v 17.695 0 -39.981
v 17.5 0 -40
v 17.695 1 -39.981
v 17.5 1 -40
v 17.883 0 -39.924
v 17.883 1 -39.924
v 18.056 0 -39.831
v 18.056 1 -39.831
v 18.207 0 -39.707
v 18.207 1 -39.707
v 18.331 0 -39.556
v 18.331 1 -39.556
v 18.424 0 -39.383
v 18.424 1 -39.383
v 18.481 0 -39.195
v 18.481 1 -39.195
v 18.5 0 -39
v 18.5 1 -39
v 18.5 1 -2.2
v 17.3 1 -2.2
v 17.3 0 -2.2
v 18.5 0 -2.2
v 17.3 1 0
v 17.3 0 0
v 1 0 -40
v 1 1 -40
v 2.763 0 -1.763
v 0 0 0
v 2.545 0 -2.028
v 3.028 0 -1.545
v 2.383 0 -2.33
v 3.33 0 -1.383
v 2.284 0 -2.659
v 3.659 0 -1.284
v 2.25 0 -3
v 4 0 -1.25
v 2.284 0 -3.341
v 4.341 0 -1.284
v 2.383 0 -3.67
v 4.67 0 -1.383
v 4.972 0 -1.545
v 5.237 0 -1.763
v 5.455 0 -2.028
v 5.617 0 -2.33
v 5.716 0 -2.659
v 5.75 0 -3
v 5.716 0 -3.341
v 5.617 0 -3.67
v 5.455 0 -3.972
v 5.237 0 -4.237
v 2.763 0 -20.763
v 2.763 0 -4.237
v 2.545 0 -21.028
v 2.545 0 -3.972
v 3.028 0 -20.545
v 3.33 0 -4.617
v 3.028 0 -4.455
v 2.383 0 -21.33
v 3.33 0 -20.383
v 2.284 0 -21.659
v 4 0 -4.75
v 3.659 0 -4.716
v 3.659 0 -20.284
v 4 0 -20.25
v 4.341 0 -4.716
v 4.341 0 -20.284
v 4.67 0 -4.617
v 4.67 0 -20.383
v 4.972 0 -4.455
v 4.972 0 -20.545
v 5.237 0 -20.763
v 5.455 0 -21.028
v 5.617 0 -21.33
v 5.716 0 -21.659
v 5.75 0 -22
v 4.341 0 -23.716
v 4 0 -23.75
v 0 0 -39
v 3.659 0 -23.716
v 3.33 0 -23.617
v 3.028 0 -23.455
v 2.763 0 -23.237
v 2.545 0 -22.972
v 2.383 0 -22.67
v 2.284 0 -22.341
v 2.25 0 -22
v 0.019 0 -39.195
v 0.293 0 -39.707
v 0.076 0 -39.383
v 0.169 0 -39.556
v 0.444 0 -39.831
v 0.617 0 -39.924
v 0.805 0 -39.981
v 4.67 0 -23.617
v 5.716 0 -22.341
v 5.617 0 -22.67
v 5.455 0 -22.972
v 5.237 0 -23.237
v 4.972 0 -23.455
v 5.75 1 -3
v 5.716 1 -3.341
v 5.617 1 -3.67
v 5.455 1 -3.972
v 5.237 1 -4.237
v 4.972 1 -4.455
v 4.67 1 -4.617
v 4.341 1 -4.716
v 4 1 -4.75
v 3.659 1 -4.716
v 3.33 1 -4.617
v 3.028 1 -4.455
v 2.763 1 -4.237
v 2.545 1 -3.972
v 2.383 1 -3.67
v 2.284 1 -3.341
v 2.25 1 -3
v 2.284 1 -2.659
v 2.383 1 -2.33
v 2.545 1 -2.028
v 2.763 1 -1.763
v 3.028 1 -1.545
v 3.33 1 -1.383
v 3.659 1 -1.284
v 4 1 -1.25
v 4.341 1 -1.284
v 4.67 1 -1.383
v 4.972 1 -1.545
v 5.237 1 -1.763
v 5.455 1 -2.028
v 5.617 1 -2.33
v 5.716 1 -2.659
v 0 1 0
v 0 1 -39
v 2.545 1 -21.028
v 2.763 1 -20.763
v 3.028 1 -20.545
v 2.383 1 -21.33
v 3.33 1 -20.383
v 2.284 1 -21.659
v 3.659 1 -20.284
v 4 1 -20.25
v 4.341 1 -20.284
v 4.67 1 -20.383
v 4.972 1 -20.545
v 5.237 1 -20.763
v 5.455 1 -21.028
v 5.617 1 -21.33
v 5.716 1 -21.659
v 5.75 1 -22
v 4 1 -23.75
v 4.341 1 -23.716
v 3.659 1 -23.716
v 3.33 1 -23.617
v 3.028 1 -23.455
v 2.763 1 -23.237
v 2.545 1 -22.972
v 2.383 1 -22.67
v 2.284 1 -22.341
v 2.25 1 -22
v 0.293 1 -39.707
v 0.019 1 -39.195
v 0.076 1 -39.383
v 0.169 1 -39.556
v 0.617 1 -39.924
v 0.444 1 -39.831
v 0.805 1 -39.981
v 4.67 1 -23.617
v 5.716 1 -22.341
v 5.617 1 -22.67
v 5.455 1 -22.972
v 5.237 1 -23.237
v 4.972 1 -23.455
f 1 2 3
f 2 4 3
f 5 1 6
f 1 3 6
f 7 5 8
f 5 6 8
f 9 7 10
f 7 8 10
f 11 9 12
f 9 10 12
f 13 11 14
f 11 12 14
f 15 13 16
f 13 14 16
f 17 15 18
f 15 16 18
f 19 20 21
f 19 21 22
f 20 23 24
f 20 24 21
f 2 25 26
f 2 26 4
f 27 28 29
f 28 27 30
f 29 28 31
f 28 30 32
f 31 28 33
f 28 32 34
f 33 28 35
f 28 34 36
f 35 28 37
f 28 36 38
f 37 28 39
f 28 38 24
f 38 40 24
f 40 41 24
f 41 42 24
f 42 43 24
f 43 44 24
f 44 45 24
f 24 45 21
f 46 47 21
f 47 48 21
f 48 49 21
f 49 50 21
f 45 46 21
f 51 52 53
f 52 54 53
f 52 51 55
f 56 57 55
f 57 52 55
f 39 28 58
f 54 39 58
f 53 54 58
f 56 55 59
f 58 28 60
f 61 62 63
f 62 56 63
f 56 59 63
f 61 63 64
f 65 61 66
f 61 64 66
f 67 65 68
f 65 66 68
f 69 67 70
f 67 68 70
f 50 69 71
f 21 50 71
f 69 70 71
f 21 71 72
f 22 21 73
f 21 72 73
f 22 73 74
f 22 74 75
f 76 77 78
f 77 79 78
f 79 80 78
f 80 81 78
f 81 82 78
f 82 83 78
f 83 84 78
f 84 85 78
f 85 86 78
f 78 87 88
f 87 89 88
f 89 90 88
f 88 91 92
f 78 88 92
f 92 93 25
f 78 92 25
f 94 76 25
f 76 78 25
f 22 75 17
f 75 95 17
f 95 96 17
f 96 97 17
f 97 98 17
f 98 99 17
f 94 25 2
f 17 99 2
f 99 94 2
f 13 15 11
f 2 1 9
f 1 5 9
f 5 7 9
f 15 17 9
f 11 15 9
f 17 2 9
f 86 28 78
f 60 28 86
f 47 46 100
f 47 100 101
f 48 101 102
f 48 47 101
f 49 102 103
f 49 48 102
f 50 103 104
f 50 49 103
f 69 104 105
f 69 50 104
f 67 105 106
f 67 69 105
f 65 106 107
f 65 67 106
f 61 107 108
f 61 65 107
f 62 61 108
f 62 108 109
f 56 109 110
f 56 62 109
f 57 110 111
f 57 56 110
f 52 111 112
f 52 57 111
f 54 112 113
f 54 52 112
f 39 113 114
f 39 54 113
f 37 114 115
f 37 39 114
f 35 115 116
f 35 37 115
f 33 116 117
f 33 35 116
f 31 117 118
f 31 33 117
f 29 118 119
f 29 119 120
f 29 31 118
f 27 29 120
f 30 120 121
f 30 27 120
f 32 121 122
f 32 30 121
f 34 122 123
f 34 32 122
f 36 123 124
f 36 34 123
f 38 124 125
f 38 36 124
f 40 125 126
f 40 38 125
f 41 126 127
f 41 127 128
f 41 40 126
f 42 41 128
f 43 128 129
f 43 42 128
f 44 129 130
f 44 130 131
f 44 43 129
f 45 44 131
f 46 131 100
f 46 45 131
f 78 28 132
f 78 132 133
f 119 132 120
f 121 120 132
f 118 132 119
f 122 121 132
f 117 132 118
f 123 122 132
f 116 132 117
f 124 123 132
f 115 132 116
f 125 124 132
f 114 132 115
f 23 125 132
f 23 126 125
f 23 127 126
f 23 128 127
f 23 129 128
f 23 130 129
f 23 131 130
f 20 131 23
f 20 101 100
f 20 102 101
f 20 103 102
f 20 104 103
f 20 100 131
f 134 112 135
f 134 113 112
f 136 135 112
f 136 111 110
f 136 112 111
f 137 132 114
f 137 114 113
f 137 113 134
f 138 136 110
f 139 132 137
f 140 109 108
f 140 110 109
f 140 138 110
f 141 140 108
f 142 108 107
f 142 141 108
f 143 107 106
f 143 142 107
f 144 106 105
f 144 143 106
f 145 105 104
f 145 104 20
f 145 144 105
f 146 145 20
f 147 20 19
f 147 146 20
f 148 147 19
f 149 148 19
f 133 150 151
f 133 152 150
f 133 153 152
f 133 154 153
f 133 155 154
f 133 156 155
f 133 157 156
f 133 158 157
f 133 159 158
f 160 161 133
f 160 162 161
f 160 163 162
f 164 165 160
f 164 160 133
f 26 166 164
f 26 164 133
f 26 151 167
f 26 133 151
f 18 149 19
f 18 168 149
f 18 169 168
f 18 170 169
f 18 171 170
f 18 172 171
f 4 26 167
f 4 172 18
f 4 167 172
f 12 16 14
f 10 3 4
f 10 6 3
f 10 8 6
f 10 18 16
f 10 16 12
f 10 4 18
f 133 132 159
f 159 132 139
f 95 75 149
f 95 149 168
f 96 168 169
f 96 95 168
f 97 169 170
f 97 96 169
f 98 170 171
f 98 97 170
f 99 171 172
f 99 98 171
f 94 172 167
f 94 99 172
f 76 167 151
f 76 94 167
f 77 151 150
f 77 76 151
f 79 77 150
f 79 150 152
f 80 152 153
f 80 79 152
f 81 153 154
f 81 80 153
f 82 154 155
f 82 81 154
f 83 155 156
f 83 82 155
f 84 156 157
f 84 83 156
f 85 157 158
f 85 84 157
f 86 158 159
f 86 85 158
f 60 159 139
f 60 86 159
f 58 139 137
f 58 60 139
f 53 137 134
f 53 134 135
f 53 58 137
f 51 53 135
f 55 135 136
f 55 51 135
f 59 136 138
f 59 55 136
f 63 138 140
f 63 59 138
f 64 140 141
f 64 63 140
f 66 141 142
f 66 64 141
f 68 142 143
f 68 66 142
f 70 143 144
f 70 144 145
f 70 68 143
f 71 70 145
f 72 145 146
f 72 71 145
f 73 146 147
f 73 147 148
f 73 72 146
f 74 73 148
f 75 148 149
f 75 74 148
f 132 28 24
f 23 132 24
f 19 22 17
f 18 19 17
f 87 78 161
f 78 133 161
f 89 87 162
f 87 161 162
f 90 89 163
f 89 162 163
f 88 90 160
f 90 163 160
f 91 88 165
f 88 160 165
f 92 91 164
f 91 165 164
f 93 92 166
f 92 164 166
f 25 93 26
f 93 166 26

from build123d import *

# Parameters (mm, degrees)
CROQUIS1_W              = 18.5
CROQUIS1_H              = 40
CROQUIS1_R              = 1.75
SALIENTE_EXTRUIR1_DEPTH = 1
CROQUIS2_W              = 1.2
CROQUIS2_H              = 2.2
CORTAR_EXTRUIR1_DEPTH   = 1
REDONDEO1_R             = 1


with BuildPart() as part:
    # Croquis1 → Saliente-Extruir1 (new body)
    with BuildSketch(Plane(origin=(0, 0, 0), x_dir=(1, 0, 0), z_dir=(0, 1, 0))):
        with Locations((9.25, 20)):
            Rectangle(CROQUIS1_W, CROQUIS1_H)
        with Locations((4, 3)):
            Circle(CROQUIS1_R, mode=Mode.SUBTRACT)
        with Locations((4, 22)):
            Circle(CROQUIS1_R, mode=Mode.SUBTRACT)
    extrude(amount=SALIENTE_EXTRUIR1_DEPTH)

    # Croquis2 → Cortar-Extruir1 (cut)
    with BuildSketch(Plane(origin=(0, 1, 0), x_dir=(1, 0, 0), z_dir=(0, 1, 0))):
        with Locations((17.9, 1.1)):
            Rectangle(CROQUIS2_W, CROQUIS2_H)
    extrude(amount=-CORTAR_EXTRUIR1_DEPTH, mode=Mode.SUBTRACT)

    # Redondeo1
    redondeo1_edges = [part.edges().sort_by_distance(p)[0] for p in [
        (0, 0.5, -40),
        (18.5, 0.5, -40),
    ]]
    fillet(redondeo1_edges, radius=REDONDEO1_R)


solid = part.part
